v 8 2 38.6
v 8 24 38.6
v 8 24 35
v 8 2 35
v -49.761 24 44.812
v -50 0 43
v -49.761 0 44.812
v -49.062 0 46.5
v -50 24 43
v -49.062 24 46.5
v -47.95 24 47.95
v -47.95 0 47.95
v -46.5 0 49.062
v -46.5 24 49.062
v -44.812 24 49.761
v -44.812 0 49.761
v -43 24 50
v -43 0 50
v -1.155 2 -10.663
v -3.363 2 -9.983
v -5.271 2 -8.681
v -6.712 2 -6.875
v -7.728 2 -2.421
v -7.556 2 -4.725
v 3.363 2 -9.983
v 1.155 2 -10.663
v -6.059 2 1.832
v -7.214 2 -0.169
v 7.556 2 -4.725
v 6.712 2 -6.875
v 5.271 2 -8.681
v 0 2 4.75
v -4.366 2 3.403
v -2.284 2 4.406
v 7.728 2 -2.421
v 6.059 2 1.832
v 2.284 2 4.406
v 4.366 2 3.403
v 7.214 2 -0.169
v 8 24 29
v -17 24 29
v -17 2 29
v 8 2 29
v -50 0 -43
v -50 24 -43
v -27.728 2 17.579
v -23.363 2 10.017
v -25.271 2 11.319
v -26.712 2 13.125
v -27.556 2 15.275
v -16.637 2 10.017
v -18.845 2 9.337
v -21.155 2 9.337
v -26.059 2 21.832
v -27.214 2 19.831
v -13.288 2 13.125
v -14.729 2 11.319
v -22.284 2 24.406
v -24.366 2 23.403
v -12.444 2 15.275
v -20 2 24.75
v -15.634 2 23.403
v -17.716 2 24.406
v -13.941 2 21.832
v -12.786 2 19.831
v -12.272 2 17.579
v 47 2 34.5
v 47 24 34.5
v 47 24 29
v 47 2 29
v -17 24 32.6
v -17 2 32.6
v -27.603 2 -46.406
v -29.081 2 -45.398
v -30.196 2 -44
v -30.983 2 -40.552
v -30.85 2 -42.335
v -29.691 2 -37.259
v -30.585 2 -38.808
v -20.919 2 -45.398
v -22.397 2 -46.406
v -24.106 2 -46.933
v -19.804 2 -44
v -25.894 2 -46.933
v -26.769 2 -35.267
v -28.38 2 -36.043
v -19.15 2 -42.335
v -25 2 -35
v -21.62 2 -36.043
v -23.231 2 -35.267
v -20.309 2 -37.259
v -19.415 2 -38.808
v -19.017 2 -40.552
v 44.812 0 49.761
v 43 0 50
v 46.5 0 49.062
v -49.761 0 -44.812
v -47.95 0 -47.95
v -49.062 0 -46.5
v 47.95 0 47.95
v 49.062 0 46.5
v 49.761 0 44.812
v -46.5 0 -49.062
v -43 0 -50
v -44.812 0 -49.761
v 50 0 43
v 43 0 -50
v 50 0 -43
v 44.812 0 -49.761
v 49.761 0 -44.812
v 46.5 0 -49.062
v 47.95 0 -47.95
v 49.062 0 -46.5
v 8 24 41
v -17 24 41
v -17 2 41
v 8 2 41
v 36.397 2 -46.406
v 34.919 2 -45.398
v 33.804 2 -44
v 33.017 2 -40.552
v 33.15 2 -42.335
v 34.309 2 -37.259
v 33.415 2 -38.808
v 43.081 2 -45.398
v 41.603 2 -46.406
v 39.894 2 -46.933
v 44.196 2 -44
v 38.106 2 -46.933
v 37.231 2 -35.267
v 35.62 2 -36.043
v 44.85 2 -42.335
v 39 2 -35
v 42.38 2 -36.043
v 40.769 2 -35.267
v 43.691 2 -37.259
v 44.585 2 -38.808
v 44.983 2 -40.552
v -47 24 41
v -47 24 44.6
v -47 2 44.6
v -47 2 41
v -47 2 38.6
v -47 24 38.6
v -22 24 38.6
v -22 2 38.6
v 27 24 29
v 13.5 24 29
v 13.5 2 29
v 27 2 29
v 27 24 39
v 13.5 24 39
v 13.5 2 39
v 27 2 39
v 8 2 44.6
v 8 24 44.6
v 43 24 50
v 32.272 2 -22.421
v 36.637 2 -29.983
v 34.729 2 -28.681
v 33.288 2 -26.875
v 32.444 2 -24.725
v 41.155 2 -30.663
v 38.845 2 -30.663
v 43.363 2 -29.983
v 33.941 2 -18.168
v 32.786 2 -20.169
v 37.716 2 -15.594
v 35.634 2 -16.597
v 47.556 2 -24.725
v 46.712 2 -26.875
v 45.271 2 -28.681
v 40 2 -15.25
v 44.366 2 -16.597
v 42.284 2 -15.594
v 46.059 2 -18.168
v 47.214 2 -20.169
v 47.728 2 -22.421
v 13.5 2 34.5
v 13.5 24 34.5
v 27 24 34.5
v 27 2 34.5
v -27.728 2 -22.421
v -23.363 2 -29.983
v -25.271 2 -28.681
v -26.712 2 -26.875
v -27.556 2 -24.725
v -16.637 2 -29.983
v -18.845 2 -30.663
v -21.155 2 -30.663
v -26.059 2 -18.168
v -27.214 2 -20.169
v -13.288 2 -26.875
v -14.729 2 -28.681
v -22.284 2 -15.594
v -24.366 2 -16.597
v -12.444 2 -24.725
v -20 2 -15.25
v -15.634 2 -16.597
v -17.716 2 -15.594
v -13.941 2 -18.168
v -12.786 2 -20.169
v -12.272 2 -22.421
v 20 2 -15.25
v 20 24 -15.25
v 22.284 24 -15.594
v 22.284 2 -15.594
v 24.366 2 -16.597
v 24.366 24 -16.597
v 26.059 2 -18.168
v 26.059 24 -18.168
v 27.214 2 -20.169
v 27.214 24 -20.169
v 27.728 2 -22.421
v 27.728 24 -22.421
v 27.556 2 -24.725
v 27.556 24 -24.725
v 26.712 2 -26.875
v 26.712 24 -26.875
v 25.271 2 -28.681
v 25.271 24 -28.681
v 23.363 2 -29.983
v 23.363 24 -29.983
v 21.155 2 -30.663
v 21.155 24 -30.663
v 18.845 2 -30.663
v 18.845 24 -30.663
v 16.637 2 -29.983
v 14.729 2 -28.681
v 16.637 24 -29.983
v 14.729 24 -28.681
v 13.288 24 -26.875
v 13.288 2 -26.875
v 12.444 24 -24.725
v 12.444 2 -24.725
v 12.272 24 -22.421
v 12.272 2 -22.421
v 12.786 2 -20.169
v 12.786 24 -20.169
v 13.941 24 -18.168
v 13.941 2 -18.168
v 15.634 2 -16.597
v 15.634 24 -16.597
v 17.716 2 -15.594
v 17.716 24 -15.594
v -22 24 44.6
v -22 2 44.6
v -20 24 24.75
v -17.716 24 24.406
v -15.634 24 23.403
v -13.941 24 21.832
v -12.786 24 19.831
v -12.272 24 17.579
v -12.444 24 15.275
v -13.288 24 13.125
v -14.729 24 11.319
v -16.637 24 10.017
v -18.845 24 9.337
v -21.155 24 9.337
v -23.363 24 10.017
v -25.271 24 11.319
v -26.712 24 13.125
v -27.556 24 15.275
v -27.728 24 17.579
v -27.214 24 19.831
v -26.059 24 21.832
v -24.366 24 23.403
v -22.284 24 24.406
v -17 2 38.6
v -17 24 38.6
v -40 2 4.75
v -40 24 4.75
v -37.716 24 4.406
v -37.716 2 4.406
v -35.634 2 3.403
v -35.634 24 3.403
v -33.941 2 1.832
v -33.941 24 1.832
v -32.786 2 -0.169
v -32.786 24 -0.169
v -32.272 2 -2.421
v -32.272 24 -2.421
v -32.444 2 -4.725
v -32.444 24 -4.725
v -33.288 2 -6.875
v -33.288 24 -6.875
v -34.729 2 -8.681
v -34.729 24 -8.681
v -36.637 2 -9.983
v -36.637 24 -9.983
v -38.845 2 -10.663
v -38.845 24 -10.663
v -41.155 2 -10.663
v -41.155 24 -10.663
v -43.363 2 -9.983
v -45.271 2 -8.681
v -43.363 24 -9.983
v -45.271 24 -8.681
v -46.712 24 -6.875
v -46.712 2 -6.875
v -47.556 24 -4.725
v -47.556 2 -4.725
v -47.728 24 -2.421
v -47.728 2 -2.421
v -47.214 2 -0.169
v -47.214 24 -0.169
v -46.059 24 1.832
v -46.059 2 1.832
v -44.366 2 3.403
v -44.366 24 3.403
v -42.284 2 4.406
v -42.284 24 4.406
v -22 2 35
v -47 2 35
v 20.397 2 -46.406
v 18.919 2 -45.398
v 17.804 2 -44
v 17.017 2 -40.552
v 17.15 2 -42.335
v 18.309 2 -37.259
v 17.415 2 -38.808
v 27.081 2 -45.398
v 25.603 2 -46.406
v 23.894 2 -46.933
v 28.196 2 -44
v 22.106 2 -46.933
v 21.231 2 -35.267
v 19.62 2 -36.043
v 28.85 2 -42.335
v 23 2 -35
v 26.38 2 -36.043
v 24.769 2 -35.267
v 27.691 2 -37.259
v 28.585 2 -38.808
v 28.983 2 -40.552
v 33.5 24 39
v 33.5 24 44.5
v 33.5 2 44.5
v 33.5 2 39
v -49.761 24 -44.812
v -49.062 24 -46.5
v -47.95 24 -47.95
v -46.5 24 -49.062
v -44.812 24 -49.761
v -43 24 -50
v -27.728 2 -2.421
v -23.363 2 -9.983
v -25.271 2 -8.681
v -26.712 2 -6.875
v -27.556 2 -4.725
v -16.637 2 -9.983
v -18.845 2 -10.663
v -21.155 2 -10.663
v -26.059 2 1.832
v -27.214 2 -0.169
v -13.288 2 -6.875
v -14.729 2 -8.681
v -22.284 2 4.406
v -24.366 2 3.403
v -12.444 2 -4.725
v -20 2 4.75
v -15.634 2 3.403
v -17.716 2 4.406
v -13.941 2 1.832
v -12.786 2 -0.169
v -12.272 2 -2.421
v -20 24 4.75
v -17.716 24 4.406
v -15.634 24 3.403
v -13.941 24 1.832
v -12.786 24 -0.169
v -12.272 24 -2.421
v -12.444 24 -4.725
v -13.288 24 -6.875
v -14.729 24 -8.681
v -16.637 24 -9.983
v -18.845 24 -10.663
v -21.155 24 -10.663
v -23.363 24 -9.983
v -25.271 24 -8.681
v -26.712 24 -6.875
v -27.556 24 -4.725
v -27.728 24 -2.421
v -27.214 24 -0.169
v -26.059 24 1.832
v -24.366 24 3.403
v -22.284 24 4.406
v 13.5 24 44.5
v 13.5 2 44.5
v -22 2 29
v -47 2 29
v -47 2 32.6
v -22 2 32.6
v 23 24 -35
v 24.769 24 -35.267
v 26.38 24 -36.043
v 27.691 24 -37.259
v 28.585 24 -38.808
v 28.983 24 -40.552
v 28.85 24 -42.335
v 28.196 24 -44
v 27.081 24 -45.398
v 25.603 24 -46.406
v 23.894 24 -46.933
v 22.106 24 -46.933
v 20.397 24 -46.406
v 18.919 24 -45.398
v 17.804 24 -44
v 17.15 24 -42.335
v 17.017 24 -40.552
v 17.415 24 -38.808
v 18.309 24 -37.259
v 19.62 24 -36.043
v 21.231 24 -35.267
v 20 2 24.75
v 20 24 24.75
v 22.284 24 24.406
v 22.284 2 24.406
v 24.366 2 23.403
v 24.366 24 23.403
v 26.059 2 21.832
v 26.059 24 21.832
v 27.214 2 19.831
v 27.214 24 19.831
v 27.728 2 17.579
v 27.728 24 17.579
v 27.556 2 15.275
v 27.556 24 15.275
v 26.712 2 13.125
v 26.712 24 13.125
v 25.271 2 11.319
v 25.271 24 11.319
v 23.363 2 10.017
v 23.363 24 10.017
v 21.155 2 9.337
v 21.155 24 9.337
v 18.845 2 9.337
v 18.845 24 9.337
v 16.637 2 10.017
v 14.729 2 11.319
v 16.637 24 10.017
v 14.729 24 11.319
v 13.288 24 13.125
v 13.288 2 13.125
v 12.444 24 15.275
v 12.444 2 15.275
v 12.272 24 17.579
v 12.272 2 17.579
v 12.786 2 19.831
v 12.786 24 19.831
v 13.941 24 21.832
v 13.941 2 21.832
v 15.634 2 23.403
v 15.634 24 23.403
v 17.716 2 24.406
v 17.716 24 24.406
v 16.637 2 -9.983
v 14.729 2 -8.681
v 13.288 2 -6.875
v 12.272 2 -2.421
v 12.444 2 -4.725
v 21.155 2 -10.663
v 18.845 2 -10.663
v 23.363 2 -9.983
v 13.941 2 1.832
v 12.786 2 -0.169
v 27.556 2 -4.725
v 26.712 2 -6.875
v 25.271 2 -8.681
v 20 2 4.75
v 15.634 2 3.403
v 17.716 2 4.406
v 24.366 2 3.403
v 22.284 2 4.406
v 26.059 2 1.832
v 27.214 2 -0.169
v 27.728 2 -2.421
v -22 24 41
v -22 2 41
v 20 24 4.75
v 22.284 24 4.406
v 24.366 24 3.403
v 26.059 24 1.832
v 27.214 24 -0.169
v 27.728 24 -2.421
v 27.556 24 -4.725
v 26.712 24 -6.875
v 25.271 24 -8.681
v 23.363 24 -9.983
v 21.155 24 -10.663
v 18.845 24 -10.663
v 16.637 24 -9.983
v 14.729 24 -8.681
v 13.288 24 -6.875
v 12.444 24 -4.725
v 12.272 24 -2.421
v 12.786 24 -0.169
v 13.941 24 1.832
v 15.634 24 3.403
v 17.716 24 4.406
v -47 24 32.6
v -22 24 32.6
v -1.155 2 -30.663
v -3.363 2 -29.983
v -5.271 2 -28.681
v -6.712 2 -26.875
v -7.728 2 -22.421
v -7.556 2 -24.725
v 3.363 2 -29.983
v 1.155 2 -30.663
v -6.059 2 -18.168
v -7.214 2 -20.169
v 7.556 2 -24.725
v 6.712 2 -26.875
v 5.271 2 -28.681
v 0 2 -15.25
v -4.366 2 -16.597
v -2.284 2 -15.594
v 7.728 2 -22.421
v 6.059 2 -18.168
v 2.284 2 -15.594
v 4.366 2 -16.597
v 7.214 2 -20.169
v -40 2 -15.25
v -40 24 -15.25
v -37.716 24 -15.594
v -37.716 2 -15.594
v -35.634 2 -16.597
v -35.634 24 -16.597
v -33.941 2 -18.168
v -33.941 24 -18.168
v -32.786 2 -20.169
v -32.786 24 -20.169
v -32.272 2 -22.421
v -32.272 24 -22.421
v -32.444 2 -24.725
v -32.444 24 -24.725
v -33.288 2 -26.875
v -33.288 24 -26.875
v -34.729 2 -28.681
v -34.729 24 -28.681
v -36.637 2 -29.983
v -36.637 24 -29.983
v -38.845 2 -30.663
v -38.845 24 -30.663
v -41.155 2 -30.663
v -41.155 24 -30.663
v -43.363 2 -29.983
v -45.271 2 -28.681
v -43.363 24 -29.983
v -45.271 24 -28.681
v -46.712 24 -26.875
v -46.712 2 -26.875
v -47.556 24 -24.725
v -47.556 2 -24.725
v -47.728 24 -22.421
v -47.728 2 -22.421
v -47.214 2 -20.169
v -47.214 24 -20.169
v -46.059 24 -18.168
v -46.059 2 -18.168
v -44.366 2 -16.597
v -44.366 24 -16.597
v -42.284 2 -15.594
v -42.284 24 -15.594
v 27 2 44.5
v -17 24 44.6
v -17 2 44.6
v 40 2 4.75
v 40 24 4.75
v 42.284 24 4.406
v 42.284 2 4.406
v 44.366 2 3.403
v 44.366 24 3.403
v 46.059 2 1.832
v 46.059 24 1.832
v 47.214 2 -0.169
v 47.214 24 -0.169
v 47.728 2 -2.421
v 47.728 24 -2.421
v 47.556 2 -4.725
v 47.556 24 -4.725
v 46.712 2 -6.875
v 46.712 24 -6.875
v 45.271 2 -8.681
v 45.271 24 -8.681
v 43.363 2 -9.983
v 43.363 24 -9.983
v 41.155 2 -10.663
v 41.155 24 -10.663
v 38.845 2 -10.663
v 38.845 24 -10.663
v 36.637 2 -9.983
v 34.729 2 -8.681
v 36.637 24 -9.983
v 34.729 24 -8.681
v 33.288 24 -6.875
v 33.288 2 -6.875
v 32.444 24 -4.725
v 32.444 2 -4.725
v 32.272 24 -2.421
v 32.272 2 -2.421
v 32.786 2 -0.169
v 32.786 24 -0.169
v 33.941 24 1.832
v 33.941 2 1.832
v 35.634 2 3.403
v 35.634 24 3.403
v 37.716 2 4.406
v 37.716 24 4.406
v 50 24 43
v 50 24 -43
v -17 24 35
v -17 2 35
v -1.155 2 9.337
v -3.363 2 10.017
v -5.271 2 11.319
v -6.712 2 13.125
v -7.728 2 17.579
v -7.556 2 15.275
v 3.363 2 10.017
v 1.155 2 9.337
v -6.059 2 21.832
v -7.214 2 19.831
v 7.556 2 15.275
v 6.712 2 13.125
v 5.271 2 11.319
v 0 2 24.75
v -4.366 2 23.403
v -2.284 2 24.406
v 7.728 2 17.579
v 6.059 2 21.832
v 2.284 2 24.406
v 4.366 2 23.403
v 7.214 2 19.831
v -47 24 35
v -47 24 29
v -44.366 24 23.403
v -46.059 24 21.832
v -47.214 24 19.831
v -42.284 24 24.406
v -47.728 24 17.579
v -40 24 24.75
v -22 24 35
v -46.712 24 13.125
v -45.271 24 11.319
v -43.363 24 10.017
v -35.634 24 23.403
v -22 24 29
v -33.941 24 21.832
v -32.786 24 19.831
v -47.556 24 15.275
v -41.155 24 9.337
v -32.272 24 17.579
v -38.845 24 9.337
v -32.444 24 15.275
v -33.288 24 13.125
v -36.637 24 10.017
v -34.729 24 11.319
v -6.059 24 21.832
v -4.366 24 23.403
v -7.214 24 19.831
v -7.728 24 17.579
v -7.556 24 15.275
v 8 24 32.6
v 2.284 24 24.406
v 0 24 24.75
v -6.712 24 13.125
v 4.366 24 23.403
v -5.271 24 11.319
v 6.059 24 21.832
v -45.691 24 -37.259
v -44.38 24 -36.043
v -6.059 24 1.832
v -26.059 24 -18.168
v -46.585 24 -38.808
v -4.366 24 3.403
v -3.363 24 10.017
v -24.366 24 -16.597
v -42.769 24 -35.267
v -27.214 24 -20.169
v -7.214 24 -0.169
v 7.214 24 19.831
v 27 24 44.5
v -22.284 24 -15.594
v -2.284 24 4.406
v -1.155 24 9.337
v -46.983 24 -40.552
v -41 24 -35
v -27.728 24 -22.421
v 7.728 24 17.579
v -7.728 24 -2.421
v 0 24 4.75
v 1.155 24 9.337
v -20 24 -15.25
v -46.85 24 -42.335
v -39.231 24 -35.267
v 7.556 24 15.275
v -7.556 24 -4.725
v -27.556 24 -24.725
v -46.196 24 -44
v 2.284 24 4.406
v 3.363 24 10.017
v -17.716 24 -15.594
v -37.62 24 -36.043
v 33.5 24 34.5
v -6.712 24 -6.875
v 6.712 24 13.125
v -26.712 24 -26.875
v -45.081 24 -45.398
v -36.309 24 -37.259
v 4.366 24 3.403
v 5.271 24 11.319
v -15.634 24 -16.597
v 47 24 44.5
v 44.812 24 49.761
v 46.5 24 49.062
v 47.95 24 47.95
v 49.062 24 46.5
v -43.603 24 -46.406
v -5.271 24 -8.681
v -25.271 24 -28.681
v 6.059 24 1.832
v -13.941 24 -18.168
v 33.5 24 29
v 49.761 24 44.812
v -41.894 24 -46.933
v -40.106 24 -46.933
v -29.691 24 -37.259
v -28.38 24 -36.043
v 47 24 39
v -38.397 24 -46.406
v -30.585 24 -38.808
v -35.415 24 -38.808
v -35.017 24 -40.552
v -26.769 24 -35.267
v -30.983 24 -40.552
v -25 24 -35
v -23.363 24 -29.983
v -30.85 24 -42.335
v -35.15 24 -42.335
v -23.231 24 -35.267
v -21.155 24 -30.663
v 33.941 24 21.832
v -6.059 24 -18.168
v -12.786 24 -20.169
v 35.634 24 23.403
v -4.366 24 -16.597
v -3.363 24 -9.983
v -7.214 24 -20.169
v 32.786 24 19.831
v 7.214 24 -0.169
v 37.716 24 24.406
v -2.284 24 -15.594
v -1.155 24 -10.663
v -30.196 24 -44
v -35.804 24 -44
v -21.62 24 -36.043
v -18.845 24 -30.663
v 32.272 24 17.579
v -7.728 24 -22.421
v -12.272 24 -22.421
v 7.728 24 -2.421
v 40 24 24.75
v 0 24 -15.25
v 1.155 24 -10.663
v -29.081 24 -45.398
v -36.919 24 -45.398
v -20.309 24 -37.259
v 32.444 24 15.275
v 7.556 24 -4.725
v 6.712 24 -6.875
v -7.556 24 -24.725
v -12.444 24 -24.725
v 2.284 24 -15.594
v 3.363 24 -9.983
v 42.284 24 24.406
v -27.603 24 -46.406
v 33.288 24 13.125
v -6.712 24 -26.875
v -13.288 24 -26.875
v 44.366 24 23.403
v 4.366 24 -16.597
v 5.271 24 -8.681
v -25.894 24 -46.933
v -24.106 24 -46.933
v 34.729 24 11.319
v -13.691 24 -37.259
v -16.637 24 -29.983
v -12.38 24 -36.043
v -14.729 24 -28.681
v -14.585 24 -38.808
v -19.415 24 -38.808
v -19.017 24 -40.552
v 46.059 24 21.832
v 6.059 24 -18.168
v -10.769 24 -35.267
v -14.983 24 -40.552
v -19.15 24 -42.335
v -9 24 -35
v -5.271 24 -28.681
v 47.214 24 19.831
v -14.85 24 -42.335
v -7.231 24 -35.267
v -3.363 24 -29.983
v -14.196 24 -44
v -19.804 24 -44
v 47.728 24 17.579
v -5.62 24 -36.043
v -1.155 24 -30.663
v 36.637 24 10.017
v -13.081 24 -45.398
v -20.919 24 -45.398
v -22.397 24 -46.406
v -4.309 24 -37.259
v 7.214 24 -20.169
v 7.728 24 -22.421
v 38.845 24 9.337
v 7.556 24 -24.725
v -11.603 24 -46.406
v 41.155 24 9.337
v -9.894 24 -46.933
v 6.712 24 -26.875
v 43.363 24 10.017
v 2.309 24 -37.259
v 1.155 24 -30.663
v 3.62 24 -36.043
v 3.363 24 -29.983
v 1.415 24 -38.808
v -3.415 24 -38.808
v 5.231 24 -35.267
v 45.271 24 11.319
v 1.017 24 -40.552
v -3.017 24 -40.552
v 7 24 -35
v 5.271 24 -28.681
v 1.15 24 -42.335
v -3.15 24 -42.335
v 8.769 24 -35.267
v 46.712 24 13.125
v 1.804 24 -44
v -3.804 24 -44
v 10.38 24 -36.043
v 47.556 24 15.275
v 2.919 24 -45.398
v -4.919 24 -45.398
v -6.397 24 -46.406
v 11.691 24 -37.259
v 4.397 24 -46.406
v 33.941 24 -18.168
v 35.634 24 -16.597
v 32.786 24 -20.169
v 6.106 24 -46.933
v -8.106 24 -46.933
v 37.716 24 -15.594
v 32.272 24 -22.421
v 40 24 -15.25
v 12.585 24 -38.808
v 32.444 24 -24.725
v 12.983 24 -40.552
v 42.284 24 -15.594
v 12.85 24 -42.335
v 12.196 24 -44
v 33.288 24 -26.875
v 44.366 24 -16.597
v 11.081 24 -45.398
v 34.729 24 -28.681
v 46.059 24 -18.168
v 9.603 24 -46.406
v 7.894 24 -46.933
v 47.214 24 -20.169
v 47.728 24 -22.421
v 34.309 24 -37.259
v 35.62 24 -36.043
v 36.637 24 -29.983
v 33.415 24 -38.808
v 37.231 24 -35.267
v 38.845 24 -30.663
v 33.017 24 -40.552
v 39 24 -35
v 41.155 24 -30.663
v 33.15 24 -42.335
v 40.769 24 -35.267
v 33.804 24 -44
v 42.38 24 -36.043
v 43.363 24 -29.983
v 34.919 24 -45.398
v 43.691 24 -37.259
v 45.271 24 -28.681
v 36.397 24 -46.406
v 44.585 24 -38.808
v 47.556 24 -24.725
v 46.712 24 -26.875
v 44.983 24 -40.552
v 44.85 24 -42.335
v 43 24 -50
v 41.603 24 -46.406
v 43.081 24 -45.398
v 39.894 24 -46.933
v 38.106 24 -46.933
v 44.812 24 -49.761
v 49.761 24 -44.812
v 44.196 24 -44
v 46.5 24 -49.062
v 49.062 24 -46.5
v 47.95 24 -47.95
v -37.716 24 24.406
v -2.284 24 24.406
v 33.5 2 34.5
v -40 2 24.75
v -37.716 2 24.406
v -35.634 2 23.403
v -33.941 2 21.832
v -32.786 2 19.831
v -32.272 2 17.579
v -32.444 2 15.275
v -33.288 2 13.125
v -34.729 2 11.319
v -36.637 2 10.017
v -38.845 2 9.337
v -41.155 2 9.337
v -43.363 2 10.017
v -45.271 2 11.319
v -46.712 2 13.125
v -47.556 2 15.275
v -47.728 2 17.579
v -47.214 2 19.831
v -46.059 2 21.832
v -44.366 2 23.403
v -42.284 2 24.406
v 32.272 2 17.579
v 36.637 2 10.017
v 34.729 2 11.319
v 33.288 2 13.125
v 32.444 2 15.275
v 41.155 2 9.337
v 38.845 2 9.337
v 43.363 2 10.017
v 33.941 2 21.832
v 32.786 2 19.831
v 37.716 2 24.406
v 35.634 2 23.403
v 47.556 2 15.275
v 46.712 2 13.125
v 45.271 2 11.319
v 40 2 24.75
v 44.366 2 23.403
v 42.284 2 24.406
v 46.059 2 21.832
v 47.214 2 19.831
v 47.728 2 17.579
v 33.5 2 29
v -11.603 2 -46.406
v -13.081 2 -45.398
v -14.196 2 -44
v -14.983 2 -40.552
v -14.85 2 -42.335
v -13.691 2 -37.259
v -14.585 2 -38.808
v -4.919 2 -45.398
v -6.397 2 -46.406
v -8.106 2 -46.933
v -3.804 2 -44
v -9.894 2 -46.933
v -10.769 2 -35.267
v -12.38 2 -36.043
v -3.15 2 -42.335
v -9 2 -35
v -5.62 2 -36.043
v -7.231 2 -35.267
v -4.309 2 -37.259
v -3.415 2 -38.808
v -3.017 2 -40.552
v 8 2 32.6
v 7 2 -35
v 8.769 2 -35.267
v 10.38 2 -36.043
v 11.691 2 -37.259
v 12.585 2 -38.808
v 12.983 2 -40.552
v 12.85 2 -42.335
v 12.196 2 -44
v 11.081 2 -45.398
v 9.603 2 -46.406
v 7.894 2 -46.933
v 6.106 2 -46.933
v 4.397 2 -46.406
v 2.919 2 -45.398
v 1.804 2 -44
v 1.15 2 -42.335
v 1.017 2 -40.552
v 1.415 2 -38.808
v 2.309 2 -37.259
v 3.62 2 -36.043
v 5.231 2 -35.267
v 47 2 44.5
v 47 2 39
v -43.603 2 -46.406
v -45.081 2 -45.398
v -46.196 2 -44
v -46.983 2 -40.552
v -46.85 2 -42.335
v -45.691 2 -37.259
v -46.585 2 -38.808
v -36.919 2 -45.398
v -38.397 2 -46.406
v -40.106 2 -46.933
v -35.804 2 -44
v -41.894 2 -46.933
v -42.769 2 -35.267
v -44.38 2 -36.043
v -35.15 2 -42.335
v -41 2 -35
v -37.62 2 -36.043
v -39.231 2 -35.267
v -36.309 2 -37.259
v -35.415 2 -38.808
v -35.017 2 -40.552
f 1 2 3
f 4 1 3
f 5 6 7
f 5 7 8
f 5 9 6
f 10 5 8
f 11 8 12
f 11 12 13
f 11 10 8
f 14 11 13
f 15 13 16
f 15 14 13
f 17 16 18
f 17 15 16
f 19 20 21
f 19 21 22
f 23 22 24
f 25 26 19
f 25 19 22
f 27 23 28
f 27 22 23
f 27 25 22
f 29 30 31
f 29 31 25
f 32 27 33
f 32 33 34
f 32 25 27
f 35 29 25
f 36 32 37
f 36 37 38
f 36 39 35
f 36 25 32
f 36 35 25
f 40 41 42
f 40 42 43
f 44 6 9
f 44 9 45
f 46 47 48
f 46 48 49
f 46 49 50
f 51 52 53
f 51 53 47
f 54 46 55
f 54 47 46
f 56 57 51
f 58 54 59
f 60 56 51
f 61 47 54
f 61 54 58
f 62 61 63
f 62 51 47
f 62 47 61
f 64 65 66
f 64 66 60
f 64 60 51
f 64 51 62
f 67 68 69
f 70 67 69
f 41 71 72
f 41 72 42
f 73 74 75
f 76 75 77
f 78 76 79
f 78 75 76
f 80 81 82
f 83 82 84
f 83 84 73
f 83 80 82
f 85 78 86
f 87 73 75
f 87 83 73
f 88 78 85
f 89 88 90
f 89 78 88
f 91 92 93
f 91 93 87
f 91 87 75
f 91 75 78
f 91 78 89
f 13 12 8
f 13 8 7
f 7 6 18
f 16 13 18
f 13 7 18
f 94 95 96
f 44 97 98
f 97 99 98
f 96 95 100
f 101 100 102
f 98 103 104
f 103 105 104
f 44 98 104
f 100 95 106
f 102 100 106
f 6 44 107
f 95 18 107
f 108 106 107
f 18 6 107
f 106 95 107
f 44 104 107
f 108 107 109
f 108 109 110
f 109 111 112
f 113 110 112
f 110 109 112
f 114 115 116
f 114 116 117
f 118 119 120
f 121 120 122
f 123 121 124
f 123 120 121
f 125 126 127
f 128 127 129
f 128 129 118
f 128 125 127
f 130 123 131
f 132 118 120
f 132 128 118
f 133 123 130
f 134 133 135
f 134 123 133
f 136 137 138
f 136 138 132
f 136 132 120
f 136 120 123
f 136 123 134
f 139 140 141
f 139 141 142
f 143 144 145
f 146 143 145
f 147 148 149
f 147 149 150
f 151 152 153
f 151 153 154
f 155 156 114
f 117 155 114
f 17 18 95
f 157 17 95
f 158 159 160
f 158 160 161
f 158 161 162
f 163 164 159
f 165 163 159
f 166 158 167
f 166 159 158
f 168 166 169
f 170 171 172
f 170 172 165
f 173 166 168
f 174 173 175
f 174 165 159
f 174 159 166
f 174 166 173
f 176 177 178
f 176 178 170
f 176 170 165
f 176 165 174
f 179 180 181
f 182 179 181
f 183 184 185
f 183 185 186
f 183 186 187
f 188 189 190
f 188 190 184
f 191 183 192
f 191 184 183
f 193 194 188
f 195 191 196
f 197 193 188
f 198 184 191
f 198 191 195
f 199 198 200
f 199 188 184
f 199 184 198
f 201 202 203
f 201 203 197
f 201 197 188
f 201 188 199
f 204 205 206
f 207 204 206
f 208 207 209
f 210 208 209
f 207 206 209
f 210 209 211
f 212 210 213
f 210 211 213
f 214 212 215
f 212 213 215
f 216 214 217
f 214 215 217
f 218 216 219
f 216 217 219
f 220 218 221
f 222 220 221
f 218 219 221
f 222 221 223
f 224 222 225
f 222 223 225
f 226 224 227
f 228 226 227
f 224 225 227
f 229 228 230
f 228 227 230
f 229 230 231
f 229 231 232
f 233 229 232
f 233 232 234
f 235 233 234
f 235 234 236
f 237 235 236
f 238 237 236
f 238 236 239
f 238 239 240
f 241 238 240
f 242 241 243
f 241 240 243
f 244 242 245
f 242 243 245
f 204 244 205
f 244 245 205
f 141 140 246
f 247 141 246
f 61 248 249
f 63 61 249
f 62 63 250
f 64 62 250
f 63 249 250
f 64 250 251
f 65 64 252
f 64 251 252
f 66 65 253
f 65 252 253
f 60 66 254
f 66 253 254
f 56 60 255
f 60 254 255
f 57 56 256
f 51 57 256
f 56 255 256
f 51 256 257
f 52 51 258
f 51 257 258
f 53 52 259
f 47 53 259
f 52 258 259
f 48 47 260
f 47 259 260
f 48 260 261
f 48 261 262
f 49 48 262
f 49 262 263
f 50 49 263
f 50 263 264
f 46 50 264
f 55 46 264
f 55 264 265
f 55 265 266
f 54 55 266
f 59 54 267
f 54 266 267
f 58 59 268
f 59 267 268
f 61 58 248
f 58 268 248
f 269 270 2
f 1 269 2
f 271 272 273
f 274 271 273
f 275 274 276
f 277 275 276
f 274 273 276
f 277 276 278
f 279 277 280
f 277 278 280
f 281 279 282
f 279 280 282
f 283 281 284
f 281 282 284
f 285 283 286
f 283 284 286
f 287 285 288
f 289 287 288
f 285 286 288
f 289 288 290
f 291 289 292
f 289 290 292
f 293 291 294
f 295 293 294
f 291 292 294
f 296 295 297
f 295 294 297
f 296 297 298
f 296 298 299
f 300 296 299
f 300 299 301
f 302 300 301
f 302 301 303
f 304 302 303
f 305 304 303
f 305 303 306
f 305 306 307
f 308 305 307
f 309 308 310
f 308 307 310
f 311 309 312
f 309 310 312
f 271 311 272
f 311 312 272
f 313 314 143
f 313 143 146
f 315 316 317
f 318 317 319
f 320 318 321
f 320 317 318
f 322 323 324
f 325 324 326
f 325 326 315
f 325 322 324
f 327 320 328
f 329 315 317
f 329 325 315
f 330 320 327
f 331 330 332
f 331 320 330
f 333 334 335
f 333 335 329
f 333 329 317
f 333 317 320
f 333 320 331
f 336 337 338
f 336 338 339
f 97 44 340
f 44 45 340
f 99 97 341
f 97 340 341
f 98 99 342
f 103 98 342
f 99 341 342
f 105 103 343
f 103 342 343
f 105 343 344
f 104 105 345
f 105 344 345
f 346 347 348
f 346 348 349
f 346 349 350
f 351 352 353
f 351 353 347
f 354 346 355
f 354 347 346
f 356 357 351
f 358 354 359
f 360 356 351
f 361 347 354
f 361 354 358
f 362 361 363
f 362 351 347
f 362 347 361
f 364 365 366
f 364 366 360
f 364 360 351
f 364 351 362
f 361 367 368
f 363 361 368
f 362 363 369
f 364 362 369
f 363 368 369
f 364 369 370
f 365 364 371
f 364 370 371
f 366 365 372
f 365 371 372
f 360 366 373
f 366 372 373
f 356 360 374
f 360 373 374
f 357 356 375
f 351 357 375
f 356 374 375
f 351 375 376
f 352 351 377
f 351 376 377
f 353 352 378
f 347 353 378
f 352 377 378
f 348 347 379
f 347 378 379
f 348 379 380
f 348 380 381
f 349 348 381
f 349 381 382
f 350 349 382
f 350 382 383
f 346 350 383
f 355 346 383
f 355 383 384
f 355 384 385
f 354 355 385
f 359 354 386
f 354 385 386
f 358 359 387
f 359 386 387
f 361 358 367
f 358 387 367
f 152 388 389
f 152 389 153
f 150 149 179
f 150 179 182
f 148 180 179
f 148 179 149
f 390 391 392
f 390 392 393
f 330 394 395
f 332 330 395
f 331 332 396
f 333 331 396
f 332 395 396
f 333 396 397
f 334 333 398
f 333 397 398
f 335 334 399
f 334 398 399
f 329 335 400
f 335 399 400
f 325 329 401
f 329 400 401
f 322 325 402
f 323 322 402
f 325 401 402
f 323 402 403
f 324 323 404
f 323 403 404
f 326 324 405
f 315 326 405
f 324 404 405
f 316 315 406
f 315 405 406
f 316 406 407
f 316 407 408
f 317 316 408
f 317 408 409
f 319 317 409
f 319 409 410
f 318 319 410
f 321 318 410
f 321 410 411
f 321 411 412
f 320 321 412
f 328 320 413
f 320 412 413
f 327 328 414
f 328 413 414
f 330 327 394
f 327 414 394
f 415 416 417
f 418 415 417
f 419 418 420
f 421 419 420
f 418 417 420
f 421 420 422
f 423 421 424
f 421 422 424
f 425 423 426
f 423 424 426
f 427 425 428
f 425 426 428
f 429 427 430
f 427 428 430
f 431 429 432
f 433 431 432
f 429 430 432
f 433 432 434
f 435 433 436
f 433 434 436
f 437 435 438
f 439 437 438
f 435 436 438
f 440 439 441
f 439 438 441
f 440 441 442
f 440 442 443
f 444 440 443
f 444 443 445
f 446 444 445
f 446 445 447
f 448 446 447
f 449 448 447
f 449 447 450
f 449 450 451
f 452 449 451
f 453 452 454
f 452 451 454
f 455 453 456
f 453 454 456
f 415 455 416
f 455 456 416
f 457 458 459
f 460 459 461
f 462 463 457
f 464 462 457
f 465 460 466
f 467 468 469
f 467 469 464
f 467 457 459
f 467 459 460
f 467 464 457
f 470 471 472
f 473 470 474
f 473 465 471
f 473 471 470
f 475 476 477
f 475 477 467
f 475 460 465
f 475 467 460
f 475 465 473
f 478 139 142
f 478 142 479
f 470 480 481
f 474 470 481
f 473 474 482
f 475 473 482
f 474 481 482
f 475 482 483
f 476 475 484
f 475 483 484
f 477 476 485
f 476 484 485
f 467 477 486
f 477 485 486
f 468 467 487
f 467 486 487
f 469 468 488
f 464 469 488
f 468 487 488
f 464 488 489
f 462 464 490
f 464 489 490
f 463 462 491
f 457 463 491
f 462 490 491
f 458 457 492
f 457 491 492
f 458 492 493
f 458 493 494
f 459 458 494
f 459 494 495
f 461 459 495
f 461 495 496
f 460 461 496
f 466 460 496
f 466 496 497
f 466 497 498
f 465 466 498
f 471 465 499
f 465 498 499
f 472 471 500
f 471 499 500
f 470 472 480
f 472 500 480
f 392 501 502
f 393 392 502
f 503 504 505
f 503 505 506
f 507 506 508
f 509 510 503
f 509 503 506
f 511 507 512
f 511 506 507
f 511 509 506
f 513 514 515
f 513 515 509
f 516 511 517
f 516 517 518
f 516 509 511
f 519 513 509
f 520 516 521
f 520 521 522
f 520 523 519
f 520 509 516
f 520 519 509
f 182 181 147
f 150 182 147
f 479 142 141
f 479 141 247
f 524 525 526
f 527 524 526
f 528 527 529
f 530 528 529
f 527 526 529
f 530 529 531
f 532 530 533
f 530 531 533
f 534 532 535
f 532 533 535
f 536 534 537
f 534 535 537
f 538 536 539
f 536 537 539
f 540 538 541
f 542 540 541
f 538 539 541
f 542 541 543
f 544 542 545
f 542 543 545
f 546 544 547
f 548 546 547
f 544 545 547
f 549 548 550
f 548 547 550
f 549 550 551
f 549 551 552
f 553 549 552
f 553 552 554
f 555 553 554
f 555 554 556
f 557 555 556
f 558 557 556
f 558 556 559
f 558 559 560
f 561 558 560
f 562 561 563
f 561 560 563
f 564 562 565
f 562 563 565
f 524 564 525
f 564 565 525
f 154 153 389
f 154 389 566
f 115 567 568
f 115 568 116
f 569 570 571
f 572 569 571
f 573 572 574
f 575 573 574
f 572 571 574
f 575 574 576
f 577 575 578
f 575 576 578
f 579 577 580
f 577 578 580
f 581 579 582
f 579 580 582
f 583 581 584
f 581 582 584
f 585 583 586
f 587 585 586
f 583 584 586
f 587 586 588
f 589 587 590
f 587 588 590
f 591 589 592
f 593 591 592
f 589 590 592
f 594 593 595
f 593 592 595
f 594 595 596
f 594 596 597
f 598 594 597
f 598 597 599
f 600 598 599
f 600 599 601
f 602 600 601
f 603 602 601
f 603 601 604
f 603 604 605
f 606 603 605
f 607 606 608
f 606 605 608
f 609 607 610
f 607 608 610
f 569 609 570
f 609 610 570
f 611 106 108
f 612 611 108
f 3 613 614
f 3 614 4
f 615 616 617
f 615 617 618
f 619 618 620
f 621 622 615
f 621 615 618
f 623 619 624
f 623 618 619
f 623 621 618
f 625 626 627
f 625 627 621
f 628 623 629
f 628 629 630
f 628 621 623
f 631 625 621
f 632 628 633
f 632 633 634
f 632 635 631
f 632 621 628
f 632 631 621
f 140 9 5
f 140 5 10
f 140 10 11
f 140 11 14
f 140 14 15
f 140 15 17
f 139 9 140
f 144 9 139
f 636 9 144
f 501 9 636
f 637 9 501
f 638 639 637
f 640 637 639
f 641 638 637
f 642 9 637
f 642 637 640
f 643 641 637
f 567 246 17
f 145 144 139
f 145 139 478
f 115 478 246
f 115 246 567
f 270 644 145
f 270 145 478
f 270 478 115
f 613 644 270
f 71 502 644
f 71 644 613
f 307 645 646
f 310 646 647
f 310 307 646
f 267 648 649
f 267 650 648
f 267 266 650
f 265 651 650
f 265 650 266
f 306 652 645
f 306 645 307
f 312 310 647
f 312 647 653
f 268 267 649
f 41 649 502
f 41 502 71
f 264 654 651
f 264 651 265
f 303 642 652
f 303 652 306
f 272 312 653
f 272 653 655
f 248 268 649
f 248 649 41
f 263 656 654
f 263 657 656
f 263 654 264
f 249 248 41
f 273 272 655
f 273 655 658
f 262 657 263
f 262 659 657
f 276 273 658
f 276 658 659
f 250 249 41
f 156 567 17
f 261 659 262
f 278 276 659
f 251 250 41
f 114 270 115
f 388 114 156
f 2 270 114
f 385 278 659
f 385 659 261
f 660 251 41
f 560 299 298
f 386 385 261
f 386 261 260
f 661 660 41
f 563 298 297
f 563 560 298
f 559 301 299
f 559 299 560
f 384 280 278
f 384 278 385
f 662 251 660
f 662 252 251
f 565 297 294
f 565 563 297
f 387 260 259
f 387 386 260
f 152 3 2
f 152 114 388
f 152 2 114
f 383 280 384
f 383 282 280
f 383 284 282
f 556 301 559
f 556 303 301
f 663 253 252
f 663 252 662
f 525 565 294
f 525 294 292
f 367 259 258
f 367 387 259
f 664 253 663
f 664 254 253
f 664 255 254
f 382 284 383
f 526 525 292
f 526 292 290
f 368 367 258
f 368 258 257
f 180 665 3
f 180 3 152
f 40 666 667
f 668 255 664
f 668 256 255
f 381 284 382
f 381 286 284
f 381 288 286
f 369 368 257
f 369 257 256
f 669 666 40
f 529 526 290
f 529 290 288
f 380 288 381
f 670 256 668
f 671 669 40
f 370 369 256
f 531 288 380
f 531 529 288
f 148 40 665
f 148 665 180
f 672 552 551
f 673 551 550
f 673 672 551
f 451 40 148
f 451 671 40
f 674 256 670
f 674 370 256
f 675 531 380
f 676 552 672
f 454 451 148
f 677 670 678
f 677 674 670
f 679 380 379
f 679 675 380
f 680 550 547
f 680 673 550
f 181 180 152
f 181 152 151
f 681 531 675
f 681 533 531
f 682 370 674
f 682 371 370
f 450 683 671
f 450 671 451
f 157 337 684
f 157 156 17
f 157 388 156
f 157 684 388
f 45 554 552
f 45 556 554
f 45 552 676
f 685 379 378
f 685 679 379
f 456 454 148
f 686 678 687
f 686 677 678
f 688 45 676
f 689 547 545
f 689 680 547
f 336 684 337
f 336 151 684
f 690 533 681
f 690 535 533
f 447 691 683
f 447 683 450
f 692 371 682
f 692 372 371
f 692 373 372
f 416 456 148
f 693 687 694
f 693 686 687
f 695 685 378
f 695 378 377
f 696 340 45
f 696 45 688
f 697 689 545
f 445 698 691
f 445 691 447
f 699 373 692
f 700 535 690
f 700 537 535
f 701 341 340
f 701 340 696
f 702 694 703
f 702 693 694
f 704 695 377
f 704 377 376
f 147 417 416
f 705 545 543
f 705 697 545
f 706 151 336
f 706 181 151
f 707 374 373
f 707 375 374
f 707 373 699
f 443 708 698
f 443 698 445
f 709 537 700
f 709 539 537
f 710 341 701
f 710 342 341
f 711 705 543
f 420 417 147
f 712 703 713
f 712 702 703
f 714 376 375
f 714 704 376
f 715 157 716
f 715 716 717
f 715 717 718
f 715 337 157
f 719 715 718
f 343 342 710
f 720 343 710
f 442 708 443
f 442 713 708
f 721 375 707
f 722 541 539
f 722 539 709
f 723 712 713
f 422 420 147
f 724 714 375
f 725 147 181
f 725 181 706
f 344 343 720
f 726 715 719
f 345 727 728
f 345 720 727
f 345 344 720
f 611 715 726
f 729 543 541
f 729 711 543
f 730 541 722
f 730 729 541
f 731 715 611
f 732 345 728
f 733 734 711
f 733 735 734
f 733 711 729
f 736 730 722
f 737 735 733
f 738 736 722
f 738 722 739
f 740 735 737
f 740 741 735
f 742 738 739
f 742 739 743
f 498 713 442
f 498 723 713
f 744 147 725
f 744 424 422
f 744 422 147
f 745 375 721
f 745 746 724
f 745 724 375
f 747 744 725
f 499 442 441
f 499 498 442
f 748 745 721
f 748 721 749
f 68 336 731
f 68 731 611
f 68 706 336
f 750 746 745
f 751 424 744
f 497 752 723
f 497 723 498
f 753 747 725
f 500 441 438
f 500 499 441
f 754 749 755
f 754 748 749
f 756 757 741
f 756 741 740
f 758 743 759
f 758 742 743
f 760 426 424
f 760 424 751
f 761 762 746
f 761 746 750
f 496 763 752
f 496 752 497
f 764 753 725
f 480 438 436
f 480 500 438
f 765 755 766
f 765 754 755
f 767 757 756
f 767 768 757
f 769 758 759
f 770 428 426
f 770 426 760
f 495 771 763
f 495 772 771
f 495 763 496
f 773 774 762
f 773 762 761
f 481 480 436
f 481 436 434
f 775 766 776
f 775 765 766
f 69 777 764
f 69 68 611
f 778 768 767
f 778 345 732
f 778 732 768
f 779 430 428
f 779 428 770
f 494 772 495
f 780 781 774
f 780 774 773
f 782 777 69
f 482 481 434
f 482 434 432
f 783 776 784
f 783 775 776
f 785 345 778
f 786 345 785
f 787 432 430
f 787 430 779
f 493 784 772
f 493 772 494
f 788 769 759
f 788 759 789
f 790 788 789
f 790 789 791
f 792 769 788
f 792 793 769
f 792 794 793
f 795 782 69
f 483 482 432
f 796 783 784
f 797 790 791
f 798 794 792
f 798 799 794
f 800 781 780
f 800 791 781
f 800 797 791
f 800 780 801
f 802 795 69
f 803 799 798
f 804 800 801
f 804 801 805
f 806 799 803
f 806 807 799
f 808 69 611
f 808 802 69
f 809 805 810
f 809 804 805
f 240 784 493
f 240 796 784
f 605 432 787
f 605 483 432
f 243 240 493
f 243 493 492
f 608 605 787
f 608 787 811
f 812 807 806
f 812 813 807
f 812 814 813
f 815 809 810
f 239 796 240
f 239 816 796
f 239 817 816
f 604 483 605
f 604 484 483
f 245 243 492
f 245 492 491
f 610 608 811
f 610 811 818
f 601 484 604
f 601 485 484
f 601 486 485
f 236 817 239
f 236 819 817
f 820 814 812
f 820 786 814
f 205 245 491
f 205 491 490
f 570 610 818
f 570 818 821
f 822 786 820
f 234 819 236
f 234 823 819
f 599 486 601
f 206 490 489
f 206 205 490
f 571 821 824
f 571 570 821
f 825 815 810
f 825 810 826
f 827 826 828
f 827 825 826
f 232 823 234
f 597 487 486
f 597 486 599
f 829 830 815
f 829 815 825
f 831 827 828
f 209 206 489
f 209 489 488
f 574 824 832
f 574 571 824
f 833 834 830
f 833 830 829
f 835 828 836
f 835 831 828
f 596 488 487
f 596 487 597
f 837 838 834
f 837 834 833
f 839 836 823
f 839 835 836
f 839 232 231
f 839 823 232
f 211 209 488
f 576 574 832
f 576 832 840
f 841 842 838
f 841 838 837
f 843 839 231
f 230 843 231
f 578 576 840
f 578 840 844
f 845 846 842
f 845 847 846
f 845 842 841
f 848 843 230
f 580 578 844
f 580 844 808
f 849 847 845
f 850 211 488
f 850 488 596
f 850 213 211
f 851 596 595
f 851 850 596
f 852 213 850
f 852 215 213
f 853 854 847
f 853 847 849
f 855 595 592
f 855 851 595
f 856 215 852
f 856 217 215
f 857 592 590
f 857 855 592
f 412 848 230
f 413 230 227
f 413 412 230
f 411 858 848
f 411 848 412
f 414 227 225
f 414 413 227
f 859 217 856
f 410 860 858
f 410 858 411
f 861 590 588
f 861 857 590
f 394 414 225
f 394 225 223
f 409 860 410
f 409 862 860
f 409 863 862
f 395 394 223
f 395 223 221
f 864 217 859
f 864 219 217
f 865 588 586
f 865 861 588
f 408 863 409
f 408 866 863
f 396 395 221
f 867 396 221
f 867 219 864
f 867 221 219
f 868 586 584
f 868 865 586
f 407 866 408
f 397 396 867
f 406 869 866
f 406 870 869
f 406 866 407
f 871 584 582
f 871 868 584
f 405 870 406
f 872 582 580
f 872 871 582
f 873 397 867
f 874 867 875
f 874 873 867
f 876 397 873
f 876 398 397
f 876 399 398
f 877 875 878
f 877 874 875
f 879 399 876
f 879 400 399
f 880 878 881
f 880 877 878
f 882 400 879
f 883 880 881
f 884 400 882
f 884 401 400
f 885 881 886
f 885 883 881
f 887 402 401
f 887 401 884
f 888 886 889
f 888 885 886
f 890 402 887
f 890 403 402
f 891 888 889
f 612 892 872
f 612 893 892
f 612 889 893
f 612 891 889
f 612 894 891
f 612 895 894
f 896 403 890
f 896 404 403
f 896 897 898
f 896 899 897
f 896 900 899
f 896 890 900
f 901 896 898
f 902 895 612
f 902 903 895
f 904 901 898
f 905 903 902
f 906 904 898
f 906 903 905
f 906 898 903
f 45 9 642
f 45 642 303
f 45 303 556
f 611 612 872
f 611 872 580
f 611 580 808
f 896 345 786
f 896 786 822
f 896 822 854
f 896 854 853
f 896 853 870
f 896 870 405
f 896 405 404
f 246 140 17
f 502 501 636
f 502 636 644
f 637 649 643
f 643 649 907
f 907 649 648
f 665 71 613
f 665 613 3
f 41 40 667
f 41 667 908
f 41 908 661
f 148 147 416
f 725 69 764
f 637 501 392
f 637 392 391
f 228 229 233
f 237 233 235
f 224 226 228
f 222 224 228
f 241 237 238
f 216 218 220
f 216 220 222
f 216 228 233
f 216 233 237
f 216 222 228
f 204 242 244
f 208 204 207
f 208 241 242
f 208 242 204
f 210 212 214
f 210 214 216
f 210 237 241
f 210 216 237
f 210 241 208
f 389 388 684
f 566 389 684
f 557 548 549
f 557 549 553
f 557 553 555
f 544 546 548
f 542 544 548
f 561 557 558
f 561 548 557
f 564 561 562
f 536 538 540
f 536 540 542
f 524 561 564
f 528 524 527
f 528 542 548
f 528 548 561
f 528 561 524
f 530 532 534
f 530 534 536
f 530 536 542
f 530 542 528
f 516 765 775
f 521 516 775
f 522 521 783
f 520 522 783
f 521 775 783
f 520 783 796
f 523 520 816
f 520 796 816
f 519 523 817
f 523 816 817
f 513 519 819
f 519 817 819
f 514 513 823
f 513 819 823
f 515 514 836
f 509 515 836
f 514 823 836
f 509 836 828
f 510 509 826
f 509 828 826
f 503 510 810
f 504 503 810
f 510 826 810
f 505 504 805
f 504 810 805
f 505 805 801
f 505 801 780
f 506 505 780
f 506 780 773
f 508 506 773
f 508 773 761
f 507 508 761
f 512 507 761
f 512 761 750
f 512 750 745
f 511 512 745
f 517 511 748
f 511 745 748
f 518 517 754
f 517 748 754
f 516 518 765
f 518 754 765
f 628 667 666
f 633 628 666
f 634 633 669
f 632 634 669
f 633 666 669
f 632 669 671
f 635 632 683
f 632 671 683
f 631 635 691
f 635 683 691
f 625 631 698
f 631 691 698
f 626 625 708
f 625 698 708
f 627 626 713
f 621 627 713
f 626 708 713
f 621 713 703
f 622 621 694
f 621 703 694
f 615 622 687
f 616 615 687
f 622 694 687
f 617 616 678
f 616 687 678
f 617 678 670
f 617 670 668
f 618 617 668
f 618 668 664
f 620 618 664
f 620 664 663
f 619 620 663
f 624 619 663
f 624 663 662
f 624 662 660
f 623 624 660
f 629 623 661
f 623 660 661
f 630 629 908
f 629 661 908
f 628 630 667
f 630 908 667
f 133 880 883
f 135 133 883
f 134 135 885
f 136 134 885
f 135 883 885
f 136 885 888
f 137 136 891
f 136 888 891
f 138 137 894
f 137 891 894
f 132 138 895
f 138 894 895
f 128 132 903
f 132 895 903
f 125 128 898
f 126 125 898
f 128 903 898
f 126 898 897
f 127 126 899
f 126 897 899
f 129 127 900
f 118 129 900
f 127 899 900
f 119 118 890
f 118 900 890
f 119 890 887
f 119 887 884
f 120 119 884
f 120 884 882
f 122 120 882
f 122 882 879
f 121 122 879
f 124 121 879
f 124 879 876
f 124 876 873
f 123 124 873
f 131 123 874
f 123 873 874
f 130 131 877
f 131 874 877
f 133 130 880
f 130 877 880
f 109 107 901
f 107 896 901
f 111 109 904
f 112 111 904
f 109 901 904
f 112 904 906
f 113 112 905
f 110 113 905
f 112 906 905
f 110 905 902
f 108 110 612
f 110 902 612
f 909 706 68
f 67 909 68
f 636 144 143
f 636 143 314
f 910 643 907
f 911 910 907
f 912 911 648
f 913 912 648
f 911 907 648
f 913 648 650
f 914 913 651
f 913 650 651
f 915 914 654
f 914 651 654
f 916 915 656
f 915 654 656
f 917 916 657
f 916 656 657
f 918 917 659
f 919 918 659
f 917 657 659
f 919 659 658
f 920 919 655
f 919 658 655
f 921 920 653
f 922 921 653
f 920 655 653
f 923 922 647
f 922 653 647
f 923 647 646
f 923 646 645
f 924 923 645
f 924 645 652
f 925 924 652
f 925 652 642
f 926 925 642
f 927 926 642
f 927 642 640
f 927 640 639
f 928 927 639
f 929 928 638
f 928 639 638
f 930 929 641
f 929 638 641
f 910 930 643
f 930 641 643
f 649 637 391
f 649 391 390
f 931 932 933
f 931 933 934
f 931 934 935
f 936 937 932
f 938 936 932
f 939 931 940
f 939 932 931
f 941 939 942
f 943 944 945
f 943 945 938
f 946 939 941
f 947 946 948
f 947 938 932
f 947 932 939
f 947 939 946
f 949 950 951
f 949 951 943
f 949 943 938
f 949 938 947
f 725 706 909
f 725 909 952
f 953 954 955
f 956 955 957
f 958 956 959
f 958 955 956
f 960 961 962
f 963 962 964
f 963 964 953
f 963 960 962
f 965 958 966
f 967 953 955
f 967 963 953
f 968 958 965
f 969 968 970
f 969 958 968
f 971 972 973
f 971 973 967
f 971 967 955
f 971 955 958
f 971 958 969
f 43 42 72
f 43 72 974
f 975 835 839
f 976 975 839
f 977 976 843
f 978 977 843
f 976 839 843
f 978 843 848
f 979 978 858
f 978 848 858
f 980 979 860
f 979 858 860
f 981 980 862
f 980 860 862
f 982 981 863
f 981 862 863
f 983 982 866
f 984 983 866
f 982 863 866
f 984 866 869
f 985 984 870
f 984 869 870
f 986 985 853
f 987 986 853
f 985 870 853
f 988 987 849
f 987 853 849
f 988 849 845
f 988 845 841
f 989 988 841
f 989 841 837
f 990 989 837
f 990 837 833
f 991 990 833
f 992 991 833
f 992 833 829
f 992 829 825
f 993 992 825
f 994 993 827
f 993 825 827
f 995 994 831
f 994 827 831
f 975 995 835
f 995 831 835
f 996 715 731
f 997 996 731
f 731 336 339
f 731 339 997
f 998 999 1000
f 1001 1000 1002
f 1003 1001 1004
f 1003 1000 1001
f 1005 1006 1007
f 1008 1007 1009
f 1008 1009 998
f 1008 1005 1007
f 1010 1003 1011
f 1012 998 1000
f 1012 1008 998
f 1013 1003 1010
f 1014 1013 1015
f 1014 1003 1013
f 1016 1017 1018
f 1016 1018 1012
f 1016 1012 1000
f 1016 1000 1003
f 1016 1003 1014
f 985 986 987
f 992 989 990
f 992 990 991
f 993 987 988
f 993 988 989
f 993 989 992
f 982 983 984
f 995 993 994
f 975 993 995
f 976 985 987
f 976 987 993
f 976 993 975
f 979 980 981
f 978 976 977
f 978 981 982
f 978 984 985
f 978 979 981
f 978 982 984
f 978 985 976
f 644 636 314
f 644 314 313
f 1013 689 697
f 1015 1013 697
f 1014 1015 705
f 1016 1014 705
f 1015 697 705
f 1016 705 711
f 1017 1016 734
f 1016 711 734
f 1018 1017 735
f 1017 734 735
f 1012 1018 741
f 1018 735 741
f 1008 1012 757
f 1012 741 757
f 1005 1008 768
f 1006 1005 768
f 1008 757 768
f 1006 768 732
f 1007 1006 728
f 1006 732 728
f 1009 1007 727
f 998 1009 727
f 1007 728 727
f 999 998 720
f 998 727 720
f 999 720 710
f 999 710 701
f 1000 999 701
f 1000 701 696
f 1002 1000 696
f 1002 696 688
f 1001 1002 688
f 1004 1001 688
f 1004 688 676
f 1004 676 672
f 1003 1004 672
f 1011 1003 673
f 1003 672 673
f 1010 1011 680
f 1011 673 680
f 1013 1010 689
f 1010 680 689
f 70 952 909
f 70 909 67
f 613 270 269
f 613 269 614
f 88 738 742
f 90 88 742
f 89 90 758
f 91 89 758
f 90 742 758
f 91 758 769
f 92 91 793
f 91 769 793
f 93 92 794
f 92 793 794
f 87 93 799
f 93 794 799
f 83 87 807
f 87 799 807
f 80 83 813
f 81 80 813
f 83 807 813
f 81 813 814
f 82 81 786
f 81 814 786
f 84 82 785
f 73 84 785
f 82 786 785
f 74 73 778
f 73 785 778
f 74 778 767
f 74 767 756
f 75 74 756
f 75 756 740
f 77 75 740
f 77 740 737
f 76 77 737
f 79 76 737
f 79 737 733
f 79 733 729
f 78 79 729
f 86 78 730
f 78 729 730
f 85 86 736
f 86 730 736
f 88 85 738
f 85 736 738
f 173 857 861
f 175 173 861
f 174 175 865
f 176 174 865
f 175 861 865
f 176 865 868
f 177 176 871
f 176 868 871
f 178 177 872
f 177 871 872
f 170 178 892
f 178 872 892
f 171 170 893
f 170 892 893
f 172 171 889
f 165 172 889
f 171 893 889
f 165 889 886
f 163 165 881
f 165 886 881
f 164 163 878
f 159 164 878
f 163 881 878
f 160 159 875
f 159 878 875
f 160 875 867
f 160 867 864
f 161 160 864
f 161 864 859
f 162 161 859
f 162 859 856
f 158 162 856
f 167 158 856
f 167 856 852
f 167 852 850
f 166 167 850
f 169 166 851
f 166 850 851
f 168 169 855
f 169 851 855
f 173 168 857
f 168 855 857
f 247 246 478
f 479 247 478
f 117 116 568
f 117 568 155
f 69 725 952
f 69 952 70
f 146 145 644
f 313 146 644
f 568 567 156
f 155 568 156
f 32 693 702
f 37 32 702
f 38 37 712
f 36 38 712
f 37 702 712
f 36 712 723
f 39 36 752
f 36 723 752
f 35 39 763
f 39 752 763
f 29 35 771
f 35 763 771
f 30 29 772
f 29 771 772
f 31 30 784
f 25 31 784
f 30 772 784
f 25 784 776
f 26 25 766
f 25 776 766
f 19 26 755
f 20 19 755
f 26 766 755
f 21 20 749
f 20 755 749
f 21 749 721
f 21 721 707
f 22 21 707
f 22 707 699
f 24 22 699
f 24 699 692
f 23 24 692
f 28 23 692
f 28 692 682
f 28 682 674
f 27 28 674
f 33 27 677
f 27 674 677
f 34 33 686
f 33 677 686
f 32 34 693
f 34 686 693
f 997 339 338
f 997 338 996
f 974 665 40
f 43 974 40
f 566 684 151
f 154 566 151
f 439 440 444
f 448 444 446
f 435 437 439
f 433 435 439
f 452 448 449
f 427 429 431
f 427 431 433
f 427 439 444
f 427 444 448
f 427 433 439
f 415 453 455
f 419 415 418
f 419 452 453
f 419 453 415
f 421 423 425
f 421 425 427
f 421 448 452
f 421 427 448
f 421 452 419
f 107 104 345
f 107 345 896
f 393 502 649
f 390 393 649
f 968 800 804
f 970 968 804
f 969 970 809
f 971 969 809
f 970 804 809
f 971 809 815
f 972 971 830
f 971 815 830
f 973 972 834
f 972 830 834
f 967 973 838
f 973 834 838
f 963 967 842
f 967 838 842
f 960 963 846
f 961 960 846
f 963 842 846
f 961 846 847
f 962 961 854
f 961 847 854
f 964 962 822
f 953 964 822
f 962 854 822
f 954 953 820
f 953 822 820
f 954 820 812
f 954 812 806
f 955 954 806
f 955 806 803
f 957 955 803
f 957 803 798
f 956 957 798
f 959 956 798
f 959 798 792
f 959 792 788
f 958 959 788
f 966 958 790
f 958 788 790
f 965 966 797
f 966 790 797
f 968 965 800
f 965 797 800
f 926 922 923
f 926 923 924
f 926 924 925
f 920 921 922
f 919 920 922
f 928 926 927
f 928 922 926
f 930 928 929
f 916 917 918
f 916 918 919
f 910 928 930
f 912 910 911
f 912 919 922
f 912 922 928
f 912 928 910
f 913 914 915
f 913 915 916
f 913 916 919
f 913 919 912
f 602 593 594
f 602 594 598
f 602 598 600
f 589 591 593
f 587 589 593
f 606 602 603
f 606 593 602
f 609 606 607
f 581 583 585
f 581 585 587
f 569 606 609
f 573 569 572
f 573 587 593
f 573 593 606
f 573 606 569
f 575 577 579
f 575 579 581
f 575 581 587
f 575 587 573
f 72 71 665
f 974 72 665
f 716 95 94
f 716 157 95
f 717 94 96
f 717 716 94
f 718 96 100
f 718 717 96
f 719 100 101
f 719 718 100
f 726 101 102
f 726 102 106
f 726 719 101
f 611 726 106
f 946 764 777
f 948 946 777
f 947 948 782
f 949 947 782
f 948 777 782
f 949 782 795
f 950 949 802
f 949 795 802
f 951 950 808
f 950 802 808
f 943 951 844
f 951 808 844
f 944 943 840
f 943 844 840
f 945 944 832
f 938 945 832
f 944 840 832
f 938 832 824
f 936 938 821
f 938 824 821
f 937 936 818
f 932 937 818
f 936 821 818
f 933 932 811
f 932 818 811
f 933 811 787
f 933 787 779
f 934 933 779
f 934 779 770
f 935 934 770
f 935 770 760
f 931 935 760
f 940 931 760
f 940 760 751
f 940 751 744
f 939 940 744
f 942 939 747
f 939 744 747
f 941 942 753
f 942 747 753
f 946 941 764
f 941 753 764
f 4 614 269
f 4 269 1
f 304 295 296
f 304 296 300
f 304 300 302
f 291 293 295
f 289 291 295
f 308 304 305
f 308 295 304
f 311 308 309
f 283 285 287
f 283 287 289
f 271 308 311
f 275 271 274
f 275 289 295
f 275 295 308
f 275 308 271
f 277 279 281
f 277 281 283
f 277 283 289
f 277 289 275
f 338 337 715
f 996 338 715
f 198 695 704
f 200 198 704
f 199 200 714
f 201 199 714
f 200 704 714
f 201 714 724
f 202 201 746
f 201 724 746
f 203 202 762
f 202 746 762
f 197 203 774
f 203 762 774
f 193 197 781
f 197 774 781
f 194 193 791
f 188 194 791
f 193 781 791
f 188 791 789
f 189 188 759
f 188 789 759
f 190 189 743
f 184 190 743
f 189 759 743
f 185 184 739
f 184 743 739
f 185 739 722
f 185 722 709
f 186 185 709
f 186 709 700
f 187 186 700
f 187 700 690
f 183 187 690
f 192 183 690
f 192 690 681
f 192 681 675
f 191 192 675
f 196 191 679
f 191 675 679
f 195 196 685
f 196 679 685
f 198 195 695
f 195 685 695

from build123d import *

# Parameters (mm, degrees)
SKETCH1_W           = 100
SKETCH1_H           = 100
BOSS_EXTRUDE1_DEPTH = 24
SKETCH2_R           = 6
SKETCH2_R_2         = 7.75
SKETCH2_W           = 25
SKETCH2_H           = 3.6
SKETCH2_W_2         = 13.5
SKETCH2_H_2         = 5.5
CUT_EXTRUDE1_DEPTH  = 22
FILLET1_R           = 7


with BuildPart() as part:
    # Sketch1 → Boss-Extrude1 (new body)
    with BuildSketch(Plane(origin=(0, 0, 0), x_dir=(1, 0, 0), z_dir=(0, 1, 0))):
        Rectangle(SKETCH1_W, SKETCH1_H)
    extrude(amount=BOSS_EXTRUDE1_DEPTH)

    # Sketch2 → Cut-Extrude1 (cut)
    with BuildSketch(Plane(origin=(0, 24, 0), x_dir=(1, 0, 0), z_dir=(0, 1, 0))):
        with Locations(Location((-41, 41, 0), (0, 0, 270))):
            Circle(SKETCH2_R)
        with Locations(Location((-25, 41, 0), (0, 0, 270))):
            Circle(SKETCH2_R)
        with Locations(Location((-9, 41, 0), (0, 0, 270))):
            Circle(SKETCH2_R)
        with Locations(Location((7, 41, 0), (0, 0, 270))):
            Circle(SKETCH2_R)
        with Locations(Location((23, 41, 0), (0, 0, 270))):
            Circle(SKETCH2_R)
        with Locations(Location((39, 41, 0), (0, 0, 270))):
            Circle(SKETCH2_R)
        with Locations(Location((-40, 23, 0), (0, 0, 270))):
            Circle(SKETCH2_R_2)
        with Locations(Location((-20, 23, 0), (0, 0, 270))):
            Circle(SKETCH2_R_2)
        with Locations(Location((0, 23, 0), (0, 0, 270))):
            Circle(SKETCH2_R_2)
        with Locations(Location((20, 23, 0), (0, 0, 270))):
            Circle(SKETCH2_R_2)
        with Locations(Location((40, 23, 0), (0, 0, 270))):
            Circle(SKETCH2_R_2)
        with Locations(Location((-20, 3, 0), (0, 0, 270))):
            Circle(SKETCH2_R_2)
        with Locations(Location((0, 3, 0), (0, 0, 270))):
            Circle(SKETCH2_R_2)
        with Locations(Location((20, 3, 0), (0, 0, 270))):
            Circle(SKETCH2_R_2)
        with Locations(Location((40, 3, 0), (0, 0, 270))):
            Circle(SKETCH2_R_2)
        with Locations(Location((-20, -17, 0), (0, 0, 270))):
            Circle(SKETCH2_R_2)
        with Locations(Location((0, -17, 0), (0, 0, 270))):
            Circle(SKETCH2_R_2)
        with Locations(Location((20, -17, 0), (0, 0, 270))):
            Circle(SKETCH2_R_2)
        with Locations(Location((40, -17, 0), (0, 0, 270))):
            Circle(SKETCH2_R_2)
        with Locations(Location((-40, 3, 0), (0, 0, 270))):
            Circle(SKETCH2_R_2)
        with Locations(Location((-40, -17, 0), (0, 0, 270))):
            Circle(SKETCH2_R_2)
        with Locations((-4.5, -30.8)):
            Rectangle(SKETCH2_W, SKETCH2_H)
        with Locations((-34.5, -30.8)):
            Rectangle(SKETCH2_W, SKETCH2_H)
        with Locations((-4.5, -36.8)):
            Rectangle(SKETCH2_W, SKETCH2_H)
        with Locations((-4.5, -42.8)):
            Rectangle(SKETCH2_W, SKETCH2_H)
        with Locations((-34.5, -36.8)):
            Rectangle(SKETCH2_W, SKETCH2_H)
        with Locations((-34.5, -42.8)):
            Rectangle(SKETCH2_W, SKETCH2_H)
        with Locations((20.25, -31.75)):
            Rectangle(SKETCH2_W_2, SKETCH2_H_2)
        with Locations((40.25, -31.75)):
            Rectangle(SKETCH2_W_2, SKETCH2_H_2)
        with Locations((20.25, -41.75)):
            Rectangle(SKETCH2_W_2, SKETCH2_H_2)
        with Locations((40.25, -41.75)):
            Rectangle(SKETCH2_W_2, SKETCH2_H_2)
    extrude(amount=-CUT_EXTRUDE1_DEPTH, mode=Mode.SUBTRACT)

    # Fillet1
    fillet1_edges = [part.edges().sort_by_distance(p)[0] for p in [
        (50, 12, 50),
        (-50, 12, 50),
        (-50, 12, -50),
        (50, 12, -50),
    ]]
    fillet(fillet1_edges, radius=FILLET1_R)


solid = part.part
